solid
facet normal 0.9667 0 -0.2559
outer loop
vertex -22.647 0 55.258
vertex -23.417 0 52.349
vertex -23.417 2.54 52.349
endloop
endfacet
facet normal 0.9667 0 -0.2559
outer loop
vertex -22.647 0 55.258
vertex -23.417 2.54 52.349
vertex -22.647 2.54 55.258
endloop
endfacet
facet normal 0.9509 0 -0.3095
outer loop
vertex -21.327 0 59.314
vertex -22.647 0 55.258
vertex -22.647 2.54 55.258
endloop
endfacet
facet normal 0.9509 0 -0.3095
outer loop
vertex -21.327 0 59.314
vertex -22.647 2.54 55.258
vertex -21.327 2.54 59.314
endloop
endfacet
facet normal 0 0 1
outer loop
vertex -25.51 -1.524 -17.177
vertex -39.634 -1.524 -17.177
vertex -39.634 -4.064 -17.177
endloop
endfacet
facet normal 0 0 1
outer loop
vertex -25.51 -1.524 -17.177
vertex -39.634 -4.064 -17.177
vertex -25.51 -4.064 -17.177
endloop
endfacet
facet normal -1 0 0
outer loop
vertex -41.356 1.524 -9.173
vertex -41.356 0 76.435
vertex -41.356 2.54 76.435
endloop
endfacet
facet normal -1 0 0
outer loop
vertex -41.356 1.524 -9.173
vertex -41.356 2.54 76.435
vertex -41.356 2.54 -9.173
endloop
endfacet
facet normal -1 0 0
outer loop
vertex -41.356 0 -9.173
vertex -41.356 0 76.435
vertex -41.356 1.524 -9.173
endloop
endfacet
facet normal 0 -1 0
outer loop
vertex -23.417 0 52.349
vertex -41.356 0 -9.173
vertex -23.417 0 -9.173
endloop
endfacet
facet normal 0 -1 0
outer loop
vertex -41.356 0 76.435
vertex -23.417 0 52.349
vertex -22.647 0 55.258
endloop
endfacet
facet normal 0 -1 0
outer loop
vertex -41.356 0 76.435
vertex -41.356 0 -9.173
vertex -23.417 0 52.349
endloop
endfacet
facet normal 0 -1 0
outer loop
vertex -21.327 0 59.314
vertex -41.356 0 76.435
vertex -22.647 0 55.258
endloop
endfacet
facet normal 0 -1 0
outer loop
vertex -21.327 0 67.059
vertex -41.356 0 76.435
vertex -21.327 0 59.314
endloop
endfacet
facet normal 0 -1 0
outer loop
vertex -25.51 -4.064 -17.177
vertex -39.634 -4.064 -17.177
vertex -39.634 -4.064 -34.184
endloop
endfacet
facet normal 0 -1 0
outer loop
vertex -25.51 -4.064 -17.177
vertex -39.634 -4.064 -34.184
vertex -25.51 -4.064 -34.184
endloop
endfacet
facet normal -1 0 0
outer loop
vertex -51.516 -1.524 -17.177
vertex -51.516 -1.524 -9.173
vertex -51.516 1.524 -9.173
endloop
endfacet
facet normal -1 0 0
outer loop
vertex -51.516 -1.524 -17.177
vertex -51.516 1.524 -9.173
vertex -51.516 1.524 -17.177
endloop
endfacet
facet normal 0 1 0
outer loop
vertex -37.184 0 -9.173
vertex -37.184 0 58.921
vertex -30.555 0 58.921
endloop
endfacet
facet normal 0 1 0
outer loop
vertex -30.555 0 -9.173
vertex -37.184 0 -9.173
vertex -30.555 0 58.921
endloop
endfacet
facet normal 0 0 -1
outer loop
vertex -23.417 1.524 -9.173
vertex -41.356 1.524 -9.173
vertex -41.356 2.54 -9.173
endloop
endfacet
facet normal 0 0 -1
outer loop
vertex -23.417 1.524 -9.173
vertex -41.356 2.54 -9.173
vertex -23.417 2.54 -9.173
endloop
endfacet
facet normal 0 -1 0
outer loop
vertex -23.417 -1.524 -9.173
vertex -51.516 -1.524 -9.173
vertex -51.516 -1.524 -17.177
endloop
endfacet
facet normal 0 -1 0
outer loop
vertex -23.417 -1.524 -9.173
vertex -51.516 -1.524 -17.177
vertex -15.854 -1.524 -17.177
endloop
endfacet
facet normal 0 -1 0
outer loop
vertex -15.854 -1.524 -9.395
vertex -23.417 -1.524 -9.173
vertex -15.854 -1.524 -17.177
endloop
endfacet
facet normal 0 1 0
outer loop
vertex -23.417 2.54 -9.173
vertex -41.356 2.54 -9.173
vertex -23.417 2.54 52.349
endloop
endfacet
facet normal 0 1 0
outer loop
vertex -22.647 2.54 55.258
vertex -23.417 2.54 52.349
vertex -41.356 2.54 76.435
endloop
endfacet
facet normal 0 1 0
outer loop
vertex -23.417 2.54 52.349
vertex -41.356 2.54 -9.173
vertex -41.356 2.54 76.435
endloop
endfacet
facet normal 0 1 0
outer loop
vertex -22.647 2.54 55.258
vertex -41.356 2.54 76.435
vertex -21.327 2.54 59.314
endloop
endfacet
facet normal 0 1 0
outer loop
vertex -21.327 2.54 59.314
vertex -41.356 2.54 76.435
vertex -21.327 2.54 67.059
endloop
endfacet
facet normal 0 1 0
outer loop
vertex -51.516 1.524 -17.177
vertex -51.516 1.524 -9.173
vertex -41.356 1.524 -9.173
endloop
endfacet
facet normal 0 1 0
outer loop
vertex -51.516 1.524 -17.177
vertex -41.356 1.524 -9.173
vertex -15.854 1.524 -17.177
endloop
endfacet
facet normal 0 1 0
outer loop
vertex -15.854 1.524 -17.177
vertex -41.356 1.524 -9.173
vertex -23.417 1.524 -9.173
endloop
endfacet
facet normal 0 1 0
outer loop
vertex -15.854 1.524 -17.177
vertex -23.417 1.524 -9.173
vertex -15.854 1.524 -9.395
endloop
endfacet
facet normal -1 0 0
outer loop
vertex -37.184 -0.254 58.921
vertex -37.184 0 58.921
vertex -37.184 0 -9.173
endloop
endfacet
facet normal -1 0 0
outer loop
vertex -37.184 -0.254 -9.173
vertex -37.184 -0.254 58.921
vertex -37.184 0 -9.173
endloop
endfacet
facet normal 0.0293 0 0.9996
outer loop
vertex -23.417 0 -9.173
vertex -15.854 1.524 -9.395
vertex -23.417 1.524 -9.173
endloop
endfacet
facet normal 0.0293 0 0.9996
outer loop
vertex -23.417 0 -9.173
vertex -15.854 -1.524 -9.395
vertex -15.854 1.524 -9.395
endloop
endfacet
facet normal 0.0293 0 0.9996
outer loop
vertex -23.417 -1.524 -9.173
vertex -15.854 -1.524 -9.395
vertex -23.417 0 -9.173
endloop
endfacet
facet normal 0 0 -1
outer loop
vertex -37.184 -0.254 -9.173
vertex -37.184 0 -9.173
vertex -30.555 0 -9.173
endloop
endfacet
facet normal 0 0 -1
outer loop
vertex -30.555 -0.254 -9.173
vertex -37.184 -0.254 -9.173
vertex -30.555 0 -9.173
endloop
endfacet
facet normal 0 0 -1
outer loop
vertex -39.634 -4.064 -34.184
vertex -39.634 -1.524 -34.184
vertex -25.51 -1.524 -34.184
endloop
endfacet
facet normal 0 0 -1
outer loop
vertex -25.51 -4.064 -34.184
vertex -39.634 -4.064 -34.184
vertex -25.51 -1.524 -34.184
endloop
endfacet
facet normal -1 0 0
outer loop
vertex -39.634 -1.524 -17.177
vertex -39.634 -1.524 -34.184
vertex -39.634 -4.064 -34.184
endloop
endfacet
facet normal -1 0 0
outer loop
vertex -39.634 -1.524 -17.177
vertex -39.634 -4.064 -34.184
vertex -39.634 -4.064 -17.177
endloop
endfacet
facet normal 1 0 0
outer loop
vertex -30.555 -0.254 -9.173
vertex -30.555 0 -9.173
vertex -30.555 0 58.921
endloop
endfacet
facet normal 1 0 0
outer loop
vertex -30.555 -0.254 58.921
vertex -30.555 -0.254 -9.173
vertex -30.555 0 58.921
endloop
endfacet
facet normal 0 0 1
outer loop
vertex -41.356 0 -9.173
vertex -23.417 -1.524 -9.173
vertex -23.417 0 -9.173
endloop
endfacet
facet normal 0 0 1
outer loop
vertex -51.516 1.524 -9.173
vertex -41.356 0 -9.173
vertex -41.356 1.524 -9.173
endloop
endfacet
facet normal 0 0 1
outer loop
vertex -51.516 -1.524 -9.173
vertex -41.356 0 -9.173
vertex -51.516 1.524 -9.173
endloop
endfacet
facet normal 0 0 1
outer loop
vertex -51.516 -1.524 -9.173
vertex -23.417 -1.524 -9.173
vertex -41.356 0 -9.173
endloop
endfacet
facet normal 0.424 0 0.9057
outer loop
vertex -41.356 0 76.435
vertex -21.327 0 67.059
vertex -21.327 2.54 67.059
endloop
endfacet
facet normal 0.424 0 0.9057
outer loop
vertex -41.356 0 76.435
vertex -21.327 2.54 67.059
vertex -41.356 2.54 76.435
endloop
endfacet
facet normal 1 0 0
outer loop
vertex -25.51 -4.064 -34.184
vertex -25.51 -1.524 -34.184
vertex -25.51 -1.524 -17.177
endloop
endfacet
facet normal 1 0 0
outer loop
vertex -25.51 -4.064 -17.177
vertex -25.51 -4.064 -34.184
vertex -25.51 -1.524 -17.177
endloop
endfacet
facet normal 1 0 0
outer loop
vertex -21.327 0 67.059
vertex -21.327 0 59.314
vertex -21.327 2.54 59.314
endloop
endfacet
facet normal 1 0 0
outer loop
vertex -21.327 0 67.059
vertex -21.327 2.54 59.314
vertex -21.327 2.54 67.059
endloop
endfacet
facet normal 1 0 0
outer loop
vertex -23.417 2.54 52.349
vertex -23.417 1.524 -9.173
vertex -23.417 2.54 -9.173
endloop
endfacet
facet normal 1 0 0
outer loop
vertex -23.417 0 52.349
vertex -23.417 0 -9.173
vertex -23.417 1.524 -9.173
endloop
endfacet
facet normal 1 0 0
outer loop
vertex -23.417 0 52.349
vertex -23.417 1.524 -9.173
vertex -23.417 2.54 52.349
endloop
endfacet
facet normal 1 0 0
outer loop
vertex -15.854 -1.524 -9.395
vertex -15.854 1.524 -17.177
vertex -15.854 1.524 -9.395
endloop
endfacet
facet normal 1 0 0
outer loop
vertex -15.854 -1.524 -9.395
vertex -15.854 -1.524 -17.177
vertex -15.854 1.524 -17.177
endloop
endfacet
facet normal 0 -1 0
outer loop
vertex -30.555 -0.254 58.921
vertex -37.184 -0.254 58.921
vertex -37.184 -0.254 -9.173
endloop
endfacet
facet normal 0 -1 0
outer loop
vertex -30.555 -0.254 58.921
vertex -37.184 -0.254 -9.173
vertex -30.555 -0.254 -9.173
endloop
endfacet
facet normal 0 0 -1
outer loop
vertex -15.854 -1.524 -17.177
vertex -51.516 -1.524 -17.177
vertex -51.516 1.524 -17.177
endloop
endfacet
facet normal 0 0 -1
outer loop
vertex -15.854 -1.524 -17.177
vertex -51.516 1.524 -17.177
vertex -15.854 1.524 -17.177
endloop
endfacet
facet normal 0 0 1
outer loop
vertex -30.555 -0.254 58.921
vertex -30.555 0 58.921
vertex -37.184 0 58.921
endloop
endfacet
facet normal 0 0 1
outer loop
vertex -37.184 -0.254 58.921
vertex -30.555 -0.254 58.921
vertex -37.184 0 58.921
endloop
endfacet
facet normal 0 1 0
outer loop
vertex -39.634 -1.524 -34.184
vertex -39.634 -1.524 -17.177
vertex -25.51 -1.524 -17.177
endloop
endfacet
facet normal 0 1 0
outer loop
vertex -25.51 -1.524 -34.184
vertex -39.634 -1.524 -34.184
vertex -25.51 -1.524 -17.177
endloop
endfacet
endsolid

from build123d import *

# Parameters (mm, degrees)
F0_W     = 6.0439221561
F0_H     = 74.2538864724
F1_DEPTH = 2.54
F3_DEPTH = 1.524
F4_W     = 14.1242705286
F4_H     = 17.0067735016
F5_DEPTH = 2.54
F7_DEPTH = 0.254


with BuildPart() as f1:
    # F0 (on Front) → F1 (new body)
    with BuildSketch(Plane.XZ):
        Polygon((-41.3562618196, 76.4354392886), (-41.3562618196, -9.1730812564), (-23.4171245247, -9.1730812564), (-23.4171245247, 50.2098016441), (-23.4171245247, 52.3489303887), (-22.6470381021, 55.2581474185), (-21.3270969689, 59.313736856), (-21.3270969689, 67.0587420464), align=None)
        with Locations((-31.3708279282, 29.9317988101)):
            Rectangle(F0_W, F0_H, mode=Mode.SUBTRACT)
        with Locations((-31.3708279282, 29.9317988101)):
            Rectangle(F0_W, F0_H)
    extrude(amount=-F1_DEPTH)

    # F2 (on face) → F3 (join, symmetric)
    with BuildSketch(Plane.XZ):
        Polygon((-23.4171245247, -9.1730812564), (-41.3562618196, -9.1730812564), (-51.5162618196, -9.1730812564), (-51.5162618196, -17.1773023903), (-15.8537700772, -17.1773023903), (-15.8537700772, -9.3945432454), align=None)
    extrude(amount=F3_DEPTH, both=True)


with BuildPart() as f5:
    # F4 (on face) → F5 (new body)
    with BuildSketch(Plane.XZ.offset(1.524)):
        with Locations((-32.5722936541, -25.6806891412)):
            Rectangle(F4_W, F4_H)
    extrude(amount=F5_DEPTH)


with BuildPart() as f7:
    # F6 (on face) → F7 (new body)
    with BuildSketch(Plane.XZ):
        Polygon((-30.5545404553, 58.9207969606), (-37.1842980385, 58.9207969606), (-37.1842980385, 18.8539940864), (-37.1842980385, 3.6947226617), (-37.1842980385, -9.1730812564), (-30.5545404553, -9.1730812564), (-30.5545404553, 3.6947226617), (-30.5545404553, 15.450575389), (-30.5545404553, 18.8539940864), align=None)
    extrude(amount=F7_DEPTH)


solid = Compound([f1.part, f5.part, f7.part])
